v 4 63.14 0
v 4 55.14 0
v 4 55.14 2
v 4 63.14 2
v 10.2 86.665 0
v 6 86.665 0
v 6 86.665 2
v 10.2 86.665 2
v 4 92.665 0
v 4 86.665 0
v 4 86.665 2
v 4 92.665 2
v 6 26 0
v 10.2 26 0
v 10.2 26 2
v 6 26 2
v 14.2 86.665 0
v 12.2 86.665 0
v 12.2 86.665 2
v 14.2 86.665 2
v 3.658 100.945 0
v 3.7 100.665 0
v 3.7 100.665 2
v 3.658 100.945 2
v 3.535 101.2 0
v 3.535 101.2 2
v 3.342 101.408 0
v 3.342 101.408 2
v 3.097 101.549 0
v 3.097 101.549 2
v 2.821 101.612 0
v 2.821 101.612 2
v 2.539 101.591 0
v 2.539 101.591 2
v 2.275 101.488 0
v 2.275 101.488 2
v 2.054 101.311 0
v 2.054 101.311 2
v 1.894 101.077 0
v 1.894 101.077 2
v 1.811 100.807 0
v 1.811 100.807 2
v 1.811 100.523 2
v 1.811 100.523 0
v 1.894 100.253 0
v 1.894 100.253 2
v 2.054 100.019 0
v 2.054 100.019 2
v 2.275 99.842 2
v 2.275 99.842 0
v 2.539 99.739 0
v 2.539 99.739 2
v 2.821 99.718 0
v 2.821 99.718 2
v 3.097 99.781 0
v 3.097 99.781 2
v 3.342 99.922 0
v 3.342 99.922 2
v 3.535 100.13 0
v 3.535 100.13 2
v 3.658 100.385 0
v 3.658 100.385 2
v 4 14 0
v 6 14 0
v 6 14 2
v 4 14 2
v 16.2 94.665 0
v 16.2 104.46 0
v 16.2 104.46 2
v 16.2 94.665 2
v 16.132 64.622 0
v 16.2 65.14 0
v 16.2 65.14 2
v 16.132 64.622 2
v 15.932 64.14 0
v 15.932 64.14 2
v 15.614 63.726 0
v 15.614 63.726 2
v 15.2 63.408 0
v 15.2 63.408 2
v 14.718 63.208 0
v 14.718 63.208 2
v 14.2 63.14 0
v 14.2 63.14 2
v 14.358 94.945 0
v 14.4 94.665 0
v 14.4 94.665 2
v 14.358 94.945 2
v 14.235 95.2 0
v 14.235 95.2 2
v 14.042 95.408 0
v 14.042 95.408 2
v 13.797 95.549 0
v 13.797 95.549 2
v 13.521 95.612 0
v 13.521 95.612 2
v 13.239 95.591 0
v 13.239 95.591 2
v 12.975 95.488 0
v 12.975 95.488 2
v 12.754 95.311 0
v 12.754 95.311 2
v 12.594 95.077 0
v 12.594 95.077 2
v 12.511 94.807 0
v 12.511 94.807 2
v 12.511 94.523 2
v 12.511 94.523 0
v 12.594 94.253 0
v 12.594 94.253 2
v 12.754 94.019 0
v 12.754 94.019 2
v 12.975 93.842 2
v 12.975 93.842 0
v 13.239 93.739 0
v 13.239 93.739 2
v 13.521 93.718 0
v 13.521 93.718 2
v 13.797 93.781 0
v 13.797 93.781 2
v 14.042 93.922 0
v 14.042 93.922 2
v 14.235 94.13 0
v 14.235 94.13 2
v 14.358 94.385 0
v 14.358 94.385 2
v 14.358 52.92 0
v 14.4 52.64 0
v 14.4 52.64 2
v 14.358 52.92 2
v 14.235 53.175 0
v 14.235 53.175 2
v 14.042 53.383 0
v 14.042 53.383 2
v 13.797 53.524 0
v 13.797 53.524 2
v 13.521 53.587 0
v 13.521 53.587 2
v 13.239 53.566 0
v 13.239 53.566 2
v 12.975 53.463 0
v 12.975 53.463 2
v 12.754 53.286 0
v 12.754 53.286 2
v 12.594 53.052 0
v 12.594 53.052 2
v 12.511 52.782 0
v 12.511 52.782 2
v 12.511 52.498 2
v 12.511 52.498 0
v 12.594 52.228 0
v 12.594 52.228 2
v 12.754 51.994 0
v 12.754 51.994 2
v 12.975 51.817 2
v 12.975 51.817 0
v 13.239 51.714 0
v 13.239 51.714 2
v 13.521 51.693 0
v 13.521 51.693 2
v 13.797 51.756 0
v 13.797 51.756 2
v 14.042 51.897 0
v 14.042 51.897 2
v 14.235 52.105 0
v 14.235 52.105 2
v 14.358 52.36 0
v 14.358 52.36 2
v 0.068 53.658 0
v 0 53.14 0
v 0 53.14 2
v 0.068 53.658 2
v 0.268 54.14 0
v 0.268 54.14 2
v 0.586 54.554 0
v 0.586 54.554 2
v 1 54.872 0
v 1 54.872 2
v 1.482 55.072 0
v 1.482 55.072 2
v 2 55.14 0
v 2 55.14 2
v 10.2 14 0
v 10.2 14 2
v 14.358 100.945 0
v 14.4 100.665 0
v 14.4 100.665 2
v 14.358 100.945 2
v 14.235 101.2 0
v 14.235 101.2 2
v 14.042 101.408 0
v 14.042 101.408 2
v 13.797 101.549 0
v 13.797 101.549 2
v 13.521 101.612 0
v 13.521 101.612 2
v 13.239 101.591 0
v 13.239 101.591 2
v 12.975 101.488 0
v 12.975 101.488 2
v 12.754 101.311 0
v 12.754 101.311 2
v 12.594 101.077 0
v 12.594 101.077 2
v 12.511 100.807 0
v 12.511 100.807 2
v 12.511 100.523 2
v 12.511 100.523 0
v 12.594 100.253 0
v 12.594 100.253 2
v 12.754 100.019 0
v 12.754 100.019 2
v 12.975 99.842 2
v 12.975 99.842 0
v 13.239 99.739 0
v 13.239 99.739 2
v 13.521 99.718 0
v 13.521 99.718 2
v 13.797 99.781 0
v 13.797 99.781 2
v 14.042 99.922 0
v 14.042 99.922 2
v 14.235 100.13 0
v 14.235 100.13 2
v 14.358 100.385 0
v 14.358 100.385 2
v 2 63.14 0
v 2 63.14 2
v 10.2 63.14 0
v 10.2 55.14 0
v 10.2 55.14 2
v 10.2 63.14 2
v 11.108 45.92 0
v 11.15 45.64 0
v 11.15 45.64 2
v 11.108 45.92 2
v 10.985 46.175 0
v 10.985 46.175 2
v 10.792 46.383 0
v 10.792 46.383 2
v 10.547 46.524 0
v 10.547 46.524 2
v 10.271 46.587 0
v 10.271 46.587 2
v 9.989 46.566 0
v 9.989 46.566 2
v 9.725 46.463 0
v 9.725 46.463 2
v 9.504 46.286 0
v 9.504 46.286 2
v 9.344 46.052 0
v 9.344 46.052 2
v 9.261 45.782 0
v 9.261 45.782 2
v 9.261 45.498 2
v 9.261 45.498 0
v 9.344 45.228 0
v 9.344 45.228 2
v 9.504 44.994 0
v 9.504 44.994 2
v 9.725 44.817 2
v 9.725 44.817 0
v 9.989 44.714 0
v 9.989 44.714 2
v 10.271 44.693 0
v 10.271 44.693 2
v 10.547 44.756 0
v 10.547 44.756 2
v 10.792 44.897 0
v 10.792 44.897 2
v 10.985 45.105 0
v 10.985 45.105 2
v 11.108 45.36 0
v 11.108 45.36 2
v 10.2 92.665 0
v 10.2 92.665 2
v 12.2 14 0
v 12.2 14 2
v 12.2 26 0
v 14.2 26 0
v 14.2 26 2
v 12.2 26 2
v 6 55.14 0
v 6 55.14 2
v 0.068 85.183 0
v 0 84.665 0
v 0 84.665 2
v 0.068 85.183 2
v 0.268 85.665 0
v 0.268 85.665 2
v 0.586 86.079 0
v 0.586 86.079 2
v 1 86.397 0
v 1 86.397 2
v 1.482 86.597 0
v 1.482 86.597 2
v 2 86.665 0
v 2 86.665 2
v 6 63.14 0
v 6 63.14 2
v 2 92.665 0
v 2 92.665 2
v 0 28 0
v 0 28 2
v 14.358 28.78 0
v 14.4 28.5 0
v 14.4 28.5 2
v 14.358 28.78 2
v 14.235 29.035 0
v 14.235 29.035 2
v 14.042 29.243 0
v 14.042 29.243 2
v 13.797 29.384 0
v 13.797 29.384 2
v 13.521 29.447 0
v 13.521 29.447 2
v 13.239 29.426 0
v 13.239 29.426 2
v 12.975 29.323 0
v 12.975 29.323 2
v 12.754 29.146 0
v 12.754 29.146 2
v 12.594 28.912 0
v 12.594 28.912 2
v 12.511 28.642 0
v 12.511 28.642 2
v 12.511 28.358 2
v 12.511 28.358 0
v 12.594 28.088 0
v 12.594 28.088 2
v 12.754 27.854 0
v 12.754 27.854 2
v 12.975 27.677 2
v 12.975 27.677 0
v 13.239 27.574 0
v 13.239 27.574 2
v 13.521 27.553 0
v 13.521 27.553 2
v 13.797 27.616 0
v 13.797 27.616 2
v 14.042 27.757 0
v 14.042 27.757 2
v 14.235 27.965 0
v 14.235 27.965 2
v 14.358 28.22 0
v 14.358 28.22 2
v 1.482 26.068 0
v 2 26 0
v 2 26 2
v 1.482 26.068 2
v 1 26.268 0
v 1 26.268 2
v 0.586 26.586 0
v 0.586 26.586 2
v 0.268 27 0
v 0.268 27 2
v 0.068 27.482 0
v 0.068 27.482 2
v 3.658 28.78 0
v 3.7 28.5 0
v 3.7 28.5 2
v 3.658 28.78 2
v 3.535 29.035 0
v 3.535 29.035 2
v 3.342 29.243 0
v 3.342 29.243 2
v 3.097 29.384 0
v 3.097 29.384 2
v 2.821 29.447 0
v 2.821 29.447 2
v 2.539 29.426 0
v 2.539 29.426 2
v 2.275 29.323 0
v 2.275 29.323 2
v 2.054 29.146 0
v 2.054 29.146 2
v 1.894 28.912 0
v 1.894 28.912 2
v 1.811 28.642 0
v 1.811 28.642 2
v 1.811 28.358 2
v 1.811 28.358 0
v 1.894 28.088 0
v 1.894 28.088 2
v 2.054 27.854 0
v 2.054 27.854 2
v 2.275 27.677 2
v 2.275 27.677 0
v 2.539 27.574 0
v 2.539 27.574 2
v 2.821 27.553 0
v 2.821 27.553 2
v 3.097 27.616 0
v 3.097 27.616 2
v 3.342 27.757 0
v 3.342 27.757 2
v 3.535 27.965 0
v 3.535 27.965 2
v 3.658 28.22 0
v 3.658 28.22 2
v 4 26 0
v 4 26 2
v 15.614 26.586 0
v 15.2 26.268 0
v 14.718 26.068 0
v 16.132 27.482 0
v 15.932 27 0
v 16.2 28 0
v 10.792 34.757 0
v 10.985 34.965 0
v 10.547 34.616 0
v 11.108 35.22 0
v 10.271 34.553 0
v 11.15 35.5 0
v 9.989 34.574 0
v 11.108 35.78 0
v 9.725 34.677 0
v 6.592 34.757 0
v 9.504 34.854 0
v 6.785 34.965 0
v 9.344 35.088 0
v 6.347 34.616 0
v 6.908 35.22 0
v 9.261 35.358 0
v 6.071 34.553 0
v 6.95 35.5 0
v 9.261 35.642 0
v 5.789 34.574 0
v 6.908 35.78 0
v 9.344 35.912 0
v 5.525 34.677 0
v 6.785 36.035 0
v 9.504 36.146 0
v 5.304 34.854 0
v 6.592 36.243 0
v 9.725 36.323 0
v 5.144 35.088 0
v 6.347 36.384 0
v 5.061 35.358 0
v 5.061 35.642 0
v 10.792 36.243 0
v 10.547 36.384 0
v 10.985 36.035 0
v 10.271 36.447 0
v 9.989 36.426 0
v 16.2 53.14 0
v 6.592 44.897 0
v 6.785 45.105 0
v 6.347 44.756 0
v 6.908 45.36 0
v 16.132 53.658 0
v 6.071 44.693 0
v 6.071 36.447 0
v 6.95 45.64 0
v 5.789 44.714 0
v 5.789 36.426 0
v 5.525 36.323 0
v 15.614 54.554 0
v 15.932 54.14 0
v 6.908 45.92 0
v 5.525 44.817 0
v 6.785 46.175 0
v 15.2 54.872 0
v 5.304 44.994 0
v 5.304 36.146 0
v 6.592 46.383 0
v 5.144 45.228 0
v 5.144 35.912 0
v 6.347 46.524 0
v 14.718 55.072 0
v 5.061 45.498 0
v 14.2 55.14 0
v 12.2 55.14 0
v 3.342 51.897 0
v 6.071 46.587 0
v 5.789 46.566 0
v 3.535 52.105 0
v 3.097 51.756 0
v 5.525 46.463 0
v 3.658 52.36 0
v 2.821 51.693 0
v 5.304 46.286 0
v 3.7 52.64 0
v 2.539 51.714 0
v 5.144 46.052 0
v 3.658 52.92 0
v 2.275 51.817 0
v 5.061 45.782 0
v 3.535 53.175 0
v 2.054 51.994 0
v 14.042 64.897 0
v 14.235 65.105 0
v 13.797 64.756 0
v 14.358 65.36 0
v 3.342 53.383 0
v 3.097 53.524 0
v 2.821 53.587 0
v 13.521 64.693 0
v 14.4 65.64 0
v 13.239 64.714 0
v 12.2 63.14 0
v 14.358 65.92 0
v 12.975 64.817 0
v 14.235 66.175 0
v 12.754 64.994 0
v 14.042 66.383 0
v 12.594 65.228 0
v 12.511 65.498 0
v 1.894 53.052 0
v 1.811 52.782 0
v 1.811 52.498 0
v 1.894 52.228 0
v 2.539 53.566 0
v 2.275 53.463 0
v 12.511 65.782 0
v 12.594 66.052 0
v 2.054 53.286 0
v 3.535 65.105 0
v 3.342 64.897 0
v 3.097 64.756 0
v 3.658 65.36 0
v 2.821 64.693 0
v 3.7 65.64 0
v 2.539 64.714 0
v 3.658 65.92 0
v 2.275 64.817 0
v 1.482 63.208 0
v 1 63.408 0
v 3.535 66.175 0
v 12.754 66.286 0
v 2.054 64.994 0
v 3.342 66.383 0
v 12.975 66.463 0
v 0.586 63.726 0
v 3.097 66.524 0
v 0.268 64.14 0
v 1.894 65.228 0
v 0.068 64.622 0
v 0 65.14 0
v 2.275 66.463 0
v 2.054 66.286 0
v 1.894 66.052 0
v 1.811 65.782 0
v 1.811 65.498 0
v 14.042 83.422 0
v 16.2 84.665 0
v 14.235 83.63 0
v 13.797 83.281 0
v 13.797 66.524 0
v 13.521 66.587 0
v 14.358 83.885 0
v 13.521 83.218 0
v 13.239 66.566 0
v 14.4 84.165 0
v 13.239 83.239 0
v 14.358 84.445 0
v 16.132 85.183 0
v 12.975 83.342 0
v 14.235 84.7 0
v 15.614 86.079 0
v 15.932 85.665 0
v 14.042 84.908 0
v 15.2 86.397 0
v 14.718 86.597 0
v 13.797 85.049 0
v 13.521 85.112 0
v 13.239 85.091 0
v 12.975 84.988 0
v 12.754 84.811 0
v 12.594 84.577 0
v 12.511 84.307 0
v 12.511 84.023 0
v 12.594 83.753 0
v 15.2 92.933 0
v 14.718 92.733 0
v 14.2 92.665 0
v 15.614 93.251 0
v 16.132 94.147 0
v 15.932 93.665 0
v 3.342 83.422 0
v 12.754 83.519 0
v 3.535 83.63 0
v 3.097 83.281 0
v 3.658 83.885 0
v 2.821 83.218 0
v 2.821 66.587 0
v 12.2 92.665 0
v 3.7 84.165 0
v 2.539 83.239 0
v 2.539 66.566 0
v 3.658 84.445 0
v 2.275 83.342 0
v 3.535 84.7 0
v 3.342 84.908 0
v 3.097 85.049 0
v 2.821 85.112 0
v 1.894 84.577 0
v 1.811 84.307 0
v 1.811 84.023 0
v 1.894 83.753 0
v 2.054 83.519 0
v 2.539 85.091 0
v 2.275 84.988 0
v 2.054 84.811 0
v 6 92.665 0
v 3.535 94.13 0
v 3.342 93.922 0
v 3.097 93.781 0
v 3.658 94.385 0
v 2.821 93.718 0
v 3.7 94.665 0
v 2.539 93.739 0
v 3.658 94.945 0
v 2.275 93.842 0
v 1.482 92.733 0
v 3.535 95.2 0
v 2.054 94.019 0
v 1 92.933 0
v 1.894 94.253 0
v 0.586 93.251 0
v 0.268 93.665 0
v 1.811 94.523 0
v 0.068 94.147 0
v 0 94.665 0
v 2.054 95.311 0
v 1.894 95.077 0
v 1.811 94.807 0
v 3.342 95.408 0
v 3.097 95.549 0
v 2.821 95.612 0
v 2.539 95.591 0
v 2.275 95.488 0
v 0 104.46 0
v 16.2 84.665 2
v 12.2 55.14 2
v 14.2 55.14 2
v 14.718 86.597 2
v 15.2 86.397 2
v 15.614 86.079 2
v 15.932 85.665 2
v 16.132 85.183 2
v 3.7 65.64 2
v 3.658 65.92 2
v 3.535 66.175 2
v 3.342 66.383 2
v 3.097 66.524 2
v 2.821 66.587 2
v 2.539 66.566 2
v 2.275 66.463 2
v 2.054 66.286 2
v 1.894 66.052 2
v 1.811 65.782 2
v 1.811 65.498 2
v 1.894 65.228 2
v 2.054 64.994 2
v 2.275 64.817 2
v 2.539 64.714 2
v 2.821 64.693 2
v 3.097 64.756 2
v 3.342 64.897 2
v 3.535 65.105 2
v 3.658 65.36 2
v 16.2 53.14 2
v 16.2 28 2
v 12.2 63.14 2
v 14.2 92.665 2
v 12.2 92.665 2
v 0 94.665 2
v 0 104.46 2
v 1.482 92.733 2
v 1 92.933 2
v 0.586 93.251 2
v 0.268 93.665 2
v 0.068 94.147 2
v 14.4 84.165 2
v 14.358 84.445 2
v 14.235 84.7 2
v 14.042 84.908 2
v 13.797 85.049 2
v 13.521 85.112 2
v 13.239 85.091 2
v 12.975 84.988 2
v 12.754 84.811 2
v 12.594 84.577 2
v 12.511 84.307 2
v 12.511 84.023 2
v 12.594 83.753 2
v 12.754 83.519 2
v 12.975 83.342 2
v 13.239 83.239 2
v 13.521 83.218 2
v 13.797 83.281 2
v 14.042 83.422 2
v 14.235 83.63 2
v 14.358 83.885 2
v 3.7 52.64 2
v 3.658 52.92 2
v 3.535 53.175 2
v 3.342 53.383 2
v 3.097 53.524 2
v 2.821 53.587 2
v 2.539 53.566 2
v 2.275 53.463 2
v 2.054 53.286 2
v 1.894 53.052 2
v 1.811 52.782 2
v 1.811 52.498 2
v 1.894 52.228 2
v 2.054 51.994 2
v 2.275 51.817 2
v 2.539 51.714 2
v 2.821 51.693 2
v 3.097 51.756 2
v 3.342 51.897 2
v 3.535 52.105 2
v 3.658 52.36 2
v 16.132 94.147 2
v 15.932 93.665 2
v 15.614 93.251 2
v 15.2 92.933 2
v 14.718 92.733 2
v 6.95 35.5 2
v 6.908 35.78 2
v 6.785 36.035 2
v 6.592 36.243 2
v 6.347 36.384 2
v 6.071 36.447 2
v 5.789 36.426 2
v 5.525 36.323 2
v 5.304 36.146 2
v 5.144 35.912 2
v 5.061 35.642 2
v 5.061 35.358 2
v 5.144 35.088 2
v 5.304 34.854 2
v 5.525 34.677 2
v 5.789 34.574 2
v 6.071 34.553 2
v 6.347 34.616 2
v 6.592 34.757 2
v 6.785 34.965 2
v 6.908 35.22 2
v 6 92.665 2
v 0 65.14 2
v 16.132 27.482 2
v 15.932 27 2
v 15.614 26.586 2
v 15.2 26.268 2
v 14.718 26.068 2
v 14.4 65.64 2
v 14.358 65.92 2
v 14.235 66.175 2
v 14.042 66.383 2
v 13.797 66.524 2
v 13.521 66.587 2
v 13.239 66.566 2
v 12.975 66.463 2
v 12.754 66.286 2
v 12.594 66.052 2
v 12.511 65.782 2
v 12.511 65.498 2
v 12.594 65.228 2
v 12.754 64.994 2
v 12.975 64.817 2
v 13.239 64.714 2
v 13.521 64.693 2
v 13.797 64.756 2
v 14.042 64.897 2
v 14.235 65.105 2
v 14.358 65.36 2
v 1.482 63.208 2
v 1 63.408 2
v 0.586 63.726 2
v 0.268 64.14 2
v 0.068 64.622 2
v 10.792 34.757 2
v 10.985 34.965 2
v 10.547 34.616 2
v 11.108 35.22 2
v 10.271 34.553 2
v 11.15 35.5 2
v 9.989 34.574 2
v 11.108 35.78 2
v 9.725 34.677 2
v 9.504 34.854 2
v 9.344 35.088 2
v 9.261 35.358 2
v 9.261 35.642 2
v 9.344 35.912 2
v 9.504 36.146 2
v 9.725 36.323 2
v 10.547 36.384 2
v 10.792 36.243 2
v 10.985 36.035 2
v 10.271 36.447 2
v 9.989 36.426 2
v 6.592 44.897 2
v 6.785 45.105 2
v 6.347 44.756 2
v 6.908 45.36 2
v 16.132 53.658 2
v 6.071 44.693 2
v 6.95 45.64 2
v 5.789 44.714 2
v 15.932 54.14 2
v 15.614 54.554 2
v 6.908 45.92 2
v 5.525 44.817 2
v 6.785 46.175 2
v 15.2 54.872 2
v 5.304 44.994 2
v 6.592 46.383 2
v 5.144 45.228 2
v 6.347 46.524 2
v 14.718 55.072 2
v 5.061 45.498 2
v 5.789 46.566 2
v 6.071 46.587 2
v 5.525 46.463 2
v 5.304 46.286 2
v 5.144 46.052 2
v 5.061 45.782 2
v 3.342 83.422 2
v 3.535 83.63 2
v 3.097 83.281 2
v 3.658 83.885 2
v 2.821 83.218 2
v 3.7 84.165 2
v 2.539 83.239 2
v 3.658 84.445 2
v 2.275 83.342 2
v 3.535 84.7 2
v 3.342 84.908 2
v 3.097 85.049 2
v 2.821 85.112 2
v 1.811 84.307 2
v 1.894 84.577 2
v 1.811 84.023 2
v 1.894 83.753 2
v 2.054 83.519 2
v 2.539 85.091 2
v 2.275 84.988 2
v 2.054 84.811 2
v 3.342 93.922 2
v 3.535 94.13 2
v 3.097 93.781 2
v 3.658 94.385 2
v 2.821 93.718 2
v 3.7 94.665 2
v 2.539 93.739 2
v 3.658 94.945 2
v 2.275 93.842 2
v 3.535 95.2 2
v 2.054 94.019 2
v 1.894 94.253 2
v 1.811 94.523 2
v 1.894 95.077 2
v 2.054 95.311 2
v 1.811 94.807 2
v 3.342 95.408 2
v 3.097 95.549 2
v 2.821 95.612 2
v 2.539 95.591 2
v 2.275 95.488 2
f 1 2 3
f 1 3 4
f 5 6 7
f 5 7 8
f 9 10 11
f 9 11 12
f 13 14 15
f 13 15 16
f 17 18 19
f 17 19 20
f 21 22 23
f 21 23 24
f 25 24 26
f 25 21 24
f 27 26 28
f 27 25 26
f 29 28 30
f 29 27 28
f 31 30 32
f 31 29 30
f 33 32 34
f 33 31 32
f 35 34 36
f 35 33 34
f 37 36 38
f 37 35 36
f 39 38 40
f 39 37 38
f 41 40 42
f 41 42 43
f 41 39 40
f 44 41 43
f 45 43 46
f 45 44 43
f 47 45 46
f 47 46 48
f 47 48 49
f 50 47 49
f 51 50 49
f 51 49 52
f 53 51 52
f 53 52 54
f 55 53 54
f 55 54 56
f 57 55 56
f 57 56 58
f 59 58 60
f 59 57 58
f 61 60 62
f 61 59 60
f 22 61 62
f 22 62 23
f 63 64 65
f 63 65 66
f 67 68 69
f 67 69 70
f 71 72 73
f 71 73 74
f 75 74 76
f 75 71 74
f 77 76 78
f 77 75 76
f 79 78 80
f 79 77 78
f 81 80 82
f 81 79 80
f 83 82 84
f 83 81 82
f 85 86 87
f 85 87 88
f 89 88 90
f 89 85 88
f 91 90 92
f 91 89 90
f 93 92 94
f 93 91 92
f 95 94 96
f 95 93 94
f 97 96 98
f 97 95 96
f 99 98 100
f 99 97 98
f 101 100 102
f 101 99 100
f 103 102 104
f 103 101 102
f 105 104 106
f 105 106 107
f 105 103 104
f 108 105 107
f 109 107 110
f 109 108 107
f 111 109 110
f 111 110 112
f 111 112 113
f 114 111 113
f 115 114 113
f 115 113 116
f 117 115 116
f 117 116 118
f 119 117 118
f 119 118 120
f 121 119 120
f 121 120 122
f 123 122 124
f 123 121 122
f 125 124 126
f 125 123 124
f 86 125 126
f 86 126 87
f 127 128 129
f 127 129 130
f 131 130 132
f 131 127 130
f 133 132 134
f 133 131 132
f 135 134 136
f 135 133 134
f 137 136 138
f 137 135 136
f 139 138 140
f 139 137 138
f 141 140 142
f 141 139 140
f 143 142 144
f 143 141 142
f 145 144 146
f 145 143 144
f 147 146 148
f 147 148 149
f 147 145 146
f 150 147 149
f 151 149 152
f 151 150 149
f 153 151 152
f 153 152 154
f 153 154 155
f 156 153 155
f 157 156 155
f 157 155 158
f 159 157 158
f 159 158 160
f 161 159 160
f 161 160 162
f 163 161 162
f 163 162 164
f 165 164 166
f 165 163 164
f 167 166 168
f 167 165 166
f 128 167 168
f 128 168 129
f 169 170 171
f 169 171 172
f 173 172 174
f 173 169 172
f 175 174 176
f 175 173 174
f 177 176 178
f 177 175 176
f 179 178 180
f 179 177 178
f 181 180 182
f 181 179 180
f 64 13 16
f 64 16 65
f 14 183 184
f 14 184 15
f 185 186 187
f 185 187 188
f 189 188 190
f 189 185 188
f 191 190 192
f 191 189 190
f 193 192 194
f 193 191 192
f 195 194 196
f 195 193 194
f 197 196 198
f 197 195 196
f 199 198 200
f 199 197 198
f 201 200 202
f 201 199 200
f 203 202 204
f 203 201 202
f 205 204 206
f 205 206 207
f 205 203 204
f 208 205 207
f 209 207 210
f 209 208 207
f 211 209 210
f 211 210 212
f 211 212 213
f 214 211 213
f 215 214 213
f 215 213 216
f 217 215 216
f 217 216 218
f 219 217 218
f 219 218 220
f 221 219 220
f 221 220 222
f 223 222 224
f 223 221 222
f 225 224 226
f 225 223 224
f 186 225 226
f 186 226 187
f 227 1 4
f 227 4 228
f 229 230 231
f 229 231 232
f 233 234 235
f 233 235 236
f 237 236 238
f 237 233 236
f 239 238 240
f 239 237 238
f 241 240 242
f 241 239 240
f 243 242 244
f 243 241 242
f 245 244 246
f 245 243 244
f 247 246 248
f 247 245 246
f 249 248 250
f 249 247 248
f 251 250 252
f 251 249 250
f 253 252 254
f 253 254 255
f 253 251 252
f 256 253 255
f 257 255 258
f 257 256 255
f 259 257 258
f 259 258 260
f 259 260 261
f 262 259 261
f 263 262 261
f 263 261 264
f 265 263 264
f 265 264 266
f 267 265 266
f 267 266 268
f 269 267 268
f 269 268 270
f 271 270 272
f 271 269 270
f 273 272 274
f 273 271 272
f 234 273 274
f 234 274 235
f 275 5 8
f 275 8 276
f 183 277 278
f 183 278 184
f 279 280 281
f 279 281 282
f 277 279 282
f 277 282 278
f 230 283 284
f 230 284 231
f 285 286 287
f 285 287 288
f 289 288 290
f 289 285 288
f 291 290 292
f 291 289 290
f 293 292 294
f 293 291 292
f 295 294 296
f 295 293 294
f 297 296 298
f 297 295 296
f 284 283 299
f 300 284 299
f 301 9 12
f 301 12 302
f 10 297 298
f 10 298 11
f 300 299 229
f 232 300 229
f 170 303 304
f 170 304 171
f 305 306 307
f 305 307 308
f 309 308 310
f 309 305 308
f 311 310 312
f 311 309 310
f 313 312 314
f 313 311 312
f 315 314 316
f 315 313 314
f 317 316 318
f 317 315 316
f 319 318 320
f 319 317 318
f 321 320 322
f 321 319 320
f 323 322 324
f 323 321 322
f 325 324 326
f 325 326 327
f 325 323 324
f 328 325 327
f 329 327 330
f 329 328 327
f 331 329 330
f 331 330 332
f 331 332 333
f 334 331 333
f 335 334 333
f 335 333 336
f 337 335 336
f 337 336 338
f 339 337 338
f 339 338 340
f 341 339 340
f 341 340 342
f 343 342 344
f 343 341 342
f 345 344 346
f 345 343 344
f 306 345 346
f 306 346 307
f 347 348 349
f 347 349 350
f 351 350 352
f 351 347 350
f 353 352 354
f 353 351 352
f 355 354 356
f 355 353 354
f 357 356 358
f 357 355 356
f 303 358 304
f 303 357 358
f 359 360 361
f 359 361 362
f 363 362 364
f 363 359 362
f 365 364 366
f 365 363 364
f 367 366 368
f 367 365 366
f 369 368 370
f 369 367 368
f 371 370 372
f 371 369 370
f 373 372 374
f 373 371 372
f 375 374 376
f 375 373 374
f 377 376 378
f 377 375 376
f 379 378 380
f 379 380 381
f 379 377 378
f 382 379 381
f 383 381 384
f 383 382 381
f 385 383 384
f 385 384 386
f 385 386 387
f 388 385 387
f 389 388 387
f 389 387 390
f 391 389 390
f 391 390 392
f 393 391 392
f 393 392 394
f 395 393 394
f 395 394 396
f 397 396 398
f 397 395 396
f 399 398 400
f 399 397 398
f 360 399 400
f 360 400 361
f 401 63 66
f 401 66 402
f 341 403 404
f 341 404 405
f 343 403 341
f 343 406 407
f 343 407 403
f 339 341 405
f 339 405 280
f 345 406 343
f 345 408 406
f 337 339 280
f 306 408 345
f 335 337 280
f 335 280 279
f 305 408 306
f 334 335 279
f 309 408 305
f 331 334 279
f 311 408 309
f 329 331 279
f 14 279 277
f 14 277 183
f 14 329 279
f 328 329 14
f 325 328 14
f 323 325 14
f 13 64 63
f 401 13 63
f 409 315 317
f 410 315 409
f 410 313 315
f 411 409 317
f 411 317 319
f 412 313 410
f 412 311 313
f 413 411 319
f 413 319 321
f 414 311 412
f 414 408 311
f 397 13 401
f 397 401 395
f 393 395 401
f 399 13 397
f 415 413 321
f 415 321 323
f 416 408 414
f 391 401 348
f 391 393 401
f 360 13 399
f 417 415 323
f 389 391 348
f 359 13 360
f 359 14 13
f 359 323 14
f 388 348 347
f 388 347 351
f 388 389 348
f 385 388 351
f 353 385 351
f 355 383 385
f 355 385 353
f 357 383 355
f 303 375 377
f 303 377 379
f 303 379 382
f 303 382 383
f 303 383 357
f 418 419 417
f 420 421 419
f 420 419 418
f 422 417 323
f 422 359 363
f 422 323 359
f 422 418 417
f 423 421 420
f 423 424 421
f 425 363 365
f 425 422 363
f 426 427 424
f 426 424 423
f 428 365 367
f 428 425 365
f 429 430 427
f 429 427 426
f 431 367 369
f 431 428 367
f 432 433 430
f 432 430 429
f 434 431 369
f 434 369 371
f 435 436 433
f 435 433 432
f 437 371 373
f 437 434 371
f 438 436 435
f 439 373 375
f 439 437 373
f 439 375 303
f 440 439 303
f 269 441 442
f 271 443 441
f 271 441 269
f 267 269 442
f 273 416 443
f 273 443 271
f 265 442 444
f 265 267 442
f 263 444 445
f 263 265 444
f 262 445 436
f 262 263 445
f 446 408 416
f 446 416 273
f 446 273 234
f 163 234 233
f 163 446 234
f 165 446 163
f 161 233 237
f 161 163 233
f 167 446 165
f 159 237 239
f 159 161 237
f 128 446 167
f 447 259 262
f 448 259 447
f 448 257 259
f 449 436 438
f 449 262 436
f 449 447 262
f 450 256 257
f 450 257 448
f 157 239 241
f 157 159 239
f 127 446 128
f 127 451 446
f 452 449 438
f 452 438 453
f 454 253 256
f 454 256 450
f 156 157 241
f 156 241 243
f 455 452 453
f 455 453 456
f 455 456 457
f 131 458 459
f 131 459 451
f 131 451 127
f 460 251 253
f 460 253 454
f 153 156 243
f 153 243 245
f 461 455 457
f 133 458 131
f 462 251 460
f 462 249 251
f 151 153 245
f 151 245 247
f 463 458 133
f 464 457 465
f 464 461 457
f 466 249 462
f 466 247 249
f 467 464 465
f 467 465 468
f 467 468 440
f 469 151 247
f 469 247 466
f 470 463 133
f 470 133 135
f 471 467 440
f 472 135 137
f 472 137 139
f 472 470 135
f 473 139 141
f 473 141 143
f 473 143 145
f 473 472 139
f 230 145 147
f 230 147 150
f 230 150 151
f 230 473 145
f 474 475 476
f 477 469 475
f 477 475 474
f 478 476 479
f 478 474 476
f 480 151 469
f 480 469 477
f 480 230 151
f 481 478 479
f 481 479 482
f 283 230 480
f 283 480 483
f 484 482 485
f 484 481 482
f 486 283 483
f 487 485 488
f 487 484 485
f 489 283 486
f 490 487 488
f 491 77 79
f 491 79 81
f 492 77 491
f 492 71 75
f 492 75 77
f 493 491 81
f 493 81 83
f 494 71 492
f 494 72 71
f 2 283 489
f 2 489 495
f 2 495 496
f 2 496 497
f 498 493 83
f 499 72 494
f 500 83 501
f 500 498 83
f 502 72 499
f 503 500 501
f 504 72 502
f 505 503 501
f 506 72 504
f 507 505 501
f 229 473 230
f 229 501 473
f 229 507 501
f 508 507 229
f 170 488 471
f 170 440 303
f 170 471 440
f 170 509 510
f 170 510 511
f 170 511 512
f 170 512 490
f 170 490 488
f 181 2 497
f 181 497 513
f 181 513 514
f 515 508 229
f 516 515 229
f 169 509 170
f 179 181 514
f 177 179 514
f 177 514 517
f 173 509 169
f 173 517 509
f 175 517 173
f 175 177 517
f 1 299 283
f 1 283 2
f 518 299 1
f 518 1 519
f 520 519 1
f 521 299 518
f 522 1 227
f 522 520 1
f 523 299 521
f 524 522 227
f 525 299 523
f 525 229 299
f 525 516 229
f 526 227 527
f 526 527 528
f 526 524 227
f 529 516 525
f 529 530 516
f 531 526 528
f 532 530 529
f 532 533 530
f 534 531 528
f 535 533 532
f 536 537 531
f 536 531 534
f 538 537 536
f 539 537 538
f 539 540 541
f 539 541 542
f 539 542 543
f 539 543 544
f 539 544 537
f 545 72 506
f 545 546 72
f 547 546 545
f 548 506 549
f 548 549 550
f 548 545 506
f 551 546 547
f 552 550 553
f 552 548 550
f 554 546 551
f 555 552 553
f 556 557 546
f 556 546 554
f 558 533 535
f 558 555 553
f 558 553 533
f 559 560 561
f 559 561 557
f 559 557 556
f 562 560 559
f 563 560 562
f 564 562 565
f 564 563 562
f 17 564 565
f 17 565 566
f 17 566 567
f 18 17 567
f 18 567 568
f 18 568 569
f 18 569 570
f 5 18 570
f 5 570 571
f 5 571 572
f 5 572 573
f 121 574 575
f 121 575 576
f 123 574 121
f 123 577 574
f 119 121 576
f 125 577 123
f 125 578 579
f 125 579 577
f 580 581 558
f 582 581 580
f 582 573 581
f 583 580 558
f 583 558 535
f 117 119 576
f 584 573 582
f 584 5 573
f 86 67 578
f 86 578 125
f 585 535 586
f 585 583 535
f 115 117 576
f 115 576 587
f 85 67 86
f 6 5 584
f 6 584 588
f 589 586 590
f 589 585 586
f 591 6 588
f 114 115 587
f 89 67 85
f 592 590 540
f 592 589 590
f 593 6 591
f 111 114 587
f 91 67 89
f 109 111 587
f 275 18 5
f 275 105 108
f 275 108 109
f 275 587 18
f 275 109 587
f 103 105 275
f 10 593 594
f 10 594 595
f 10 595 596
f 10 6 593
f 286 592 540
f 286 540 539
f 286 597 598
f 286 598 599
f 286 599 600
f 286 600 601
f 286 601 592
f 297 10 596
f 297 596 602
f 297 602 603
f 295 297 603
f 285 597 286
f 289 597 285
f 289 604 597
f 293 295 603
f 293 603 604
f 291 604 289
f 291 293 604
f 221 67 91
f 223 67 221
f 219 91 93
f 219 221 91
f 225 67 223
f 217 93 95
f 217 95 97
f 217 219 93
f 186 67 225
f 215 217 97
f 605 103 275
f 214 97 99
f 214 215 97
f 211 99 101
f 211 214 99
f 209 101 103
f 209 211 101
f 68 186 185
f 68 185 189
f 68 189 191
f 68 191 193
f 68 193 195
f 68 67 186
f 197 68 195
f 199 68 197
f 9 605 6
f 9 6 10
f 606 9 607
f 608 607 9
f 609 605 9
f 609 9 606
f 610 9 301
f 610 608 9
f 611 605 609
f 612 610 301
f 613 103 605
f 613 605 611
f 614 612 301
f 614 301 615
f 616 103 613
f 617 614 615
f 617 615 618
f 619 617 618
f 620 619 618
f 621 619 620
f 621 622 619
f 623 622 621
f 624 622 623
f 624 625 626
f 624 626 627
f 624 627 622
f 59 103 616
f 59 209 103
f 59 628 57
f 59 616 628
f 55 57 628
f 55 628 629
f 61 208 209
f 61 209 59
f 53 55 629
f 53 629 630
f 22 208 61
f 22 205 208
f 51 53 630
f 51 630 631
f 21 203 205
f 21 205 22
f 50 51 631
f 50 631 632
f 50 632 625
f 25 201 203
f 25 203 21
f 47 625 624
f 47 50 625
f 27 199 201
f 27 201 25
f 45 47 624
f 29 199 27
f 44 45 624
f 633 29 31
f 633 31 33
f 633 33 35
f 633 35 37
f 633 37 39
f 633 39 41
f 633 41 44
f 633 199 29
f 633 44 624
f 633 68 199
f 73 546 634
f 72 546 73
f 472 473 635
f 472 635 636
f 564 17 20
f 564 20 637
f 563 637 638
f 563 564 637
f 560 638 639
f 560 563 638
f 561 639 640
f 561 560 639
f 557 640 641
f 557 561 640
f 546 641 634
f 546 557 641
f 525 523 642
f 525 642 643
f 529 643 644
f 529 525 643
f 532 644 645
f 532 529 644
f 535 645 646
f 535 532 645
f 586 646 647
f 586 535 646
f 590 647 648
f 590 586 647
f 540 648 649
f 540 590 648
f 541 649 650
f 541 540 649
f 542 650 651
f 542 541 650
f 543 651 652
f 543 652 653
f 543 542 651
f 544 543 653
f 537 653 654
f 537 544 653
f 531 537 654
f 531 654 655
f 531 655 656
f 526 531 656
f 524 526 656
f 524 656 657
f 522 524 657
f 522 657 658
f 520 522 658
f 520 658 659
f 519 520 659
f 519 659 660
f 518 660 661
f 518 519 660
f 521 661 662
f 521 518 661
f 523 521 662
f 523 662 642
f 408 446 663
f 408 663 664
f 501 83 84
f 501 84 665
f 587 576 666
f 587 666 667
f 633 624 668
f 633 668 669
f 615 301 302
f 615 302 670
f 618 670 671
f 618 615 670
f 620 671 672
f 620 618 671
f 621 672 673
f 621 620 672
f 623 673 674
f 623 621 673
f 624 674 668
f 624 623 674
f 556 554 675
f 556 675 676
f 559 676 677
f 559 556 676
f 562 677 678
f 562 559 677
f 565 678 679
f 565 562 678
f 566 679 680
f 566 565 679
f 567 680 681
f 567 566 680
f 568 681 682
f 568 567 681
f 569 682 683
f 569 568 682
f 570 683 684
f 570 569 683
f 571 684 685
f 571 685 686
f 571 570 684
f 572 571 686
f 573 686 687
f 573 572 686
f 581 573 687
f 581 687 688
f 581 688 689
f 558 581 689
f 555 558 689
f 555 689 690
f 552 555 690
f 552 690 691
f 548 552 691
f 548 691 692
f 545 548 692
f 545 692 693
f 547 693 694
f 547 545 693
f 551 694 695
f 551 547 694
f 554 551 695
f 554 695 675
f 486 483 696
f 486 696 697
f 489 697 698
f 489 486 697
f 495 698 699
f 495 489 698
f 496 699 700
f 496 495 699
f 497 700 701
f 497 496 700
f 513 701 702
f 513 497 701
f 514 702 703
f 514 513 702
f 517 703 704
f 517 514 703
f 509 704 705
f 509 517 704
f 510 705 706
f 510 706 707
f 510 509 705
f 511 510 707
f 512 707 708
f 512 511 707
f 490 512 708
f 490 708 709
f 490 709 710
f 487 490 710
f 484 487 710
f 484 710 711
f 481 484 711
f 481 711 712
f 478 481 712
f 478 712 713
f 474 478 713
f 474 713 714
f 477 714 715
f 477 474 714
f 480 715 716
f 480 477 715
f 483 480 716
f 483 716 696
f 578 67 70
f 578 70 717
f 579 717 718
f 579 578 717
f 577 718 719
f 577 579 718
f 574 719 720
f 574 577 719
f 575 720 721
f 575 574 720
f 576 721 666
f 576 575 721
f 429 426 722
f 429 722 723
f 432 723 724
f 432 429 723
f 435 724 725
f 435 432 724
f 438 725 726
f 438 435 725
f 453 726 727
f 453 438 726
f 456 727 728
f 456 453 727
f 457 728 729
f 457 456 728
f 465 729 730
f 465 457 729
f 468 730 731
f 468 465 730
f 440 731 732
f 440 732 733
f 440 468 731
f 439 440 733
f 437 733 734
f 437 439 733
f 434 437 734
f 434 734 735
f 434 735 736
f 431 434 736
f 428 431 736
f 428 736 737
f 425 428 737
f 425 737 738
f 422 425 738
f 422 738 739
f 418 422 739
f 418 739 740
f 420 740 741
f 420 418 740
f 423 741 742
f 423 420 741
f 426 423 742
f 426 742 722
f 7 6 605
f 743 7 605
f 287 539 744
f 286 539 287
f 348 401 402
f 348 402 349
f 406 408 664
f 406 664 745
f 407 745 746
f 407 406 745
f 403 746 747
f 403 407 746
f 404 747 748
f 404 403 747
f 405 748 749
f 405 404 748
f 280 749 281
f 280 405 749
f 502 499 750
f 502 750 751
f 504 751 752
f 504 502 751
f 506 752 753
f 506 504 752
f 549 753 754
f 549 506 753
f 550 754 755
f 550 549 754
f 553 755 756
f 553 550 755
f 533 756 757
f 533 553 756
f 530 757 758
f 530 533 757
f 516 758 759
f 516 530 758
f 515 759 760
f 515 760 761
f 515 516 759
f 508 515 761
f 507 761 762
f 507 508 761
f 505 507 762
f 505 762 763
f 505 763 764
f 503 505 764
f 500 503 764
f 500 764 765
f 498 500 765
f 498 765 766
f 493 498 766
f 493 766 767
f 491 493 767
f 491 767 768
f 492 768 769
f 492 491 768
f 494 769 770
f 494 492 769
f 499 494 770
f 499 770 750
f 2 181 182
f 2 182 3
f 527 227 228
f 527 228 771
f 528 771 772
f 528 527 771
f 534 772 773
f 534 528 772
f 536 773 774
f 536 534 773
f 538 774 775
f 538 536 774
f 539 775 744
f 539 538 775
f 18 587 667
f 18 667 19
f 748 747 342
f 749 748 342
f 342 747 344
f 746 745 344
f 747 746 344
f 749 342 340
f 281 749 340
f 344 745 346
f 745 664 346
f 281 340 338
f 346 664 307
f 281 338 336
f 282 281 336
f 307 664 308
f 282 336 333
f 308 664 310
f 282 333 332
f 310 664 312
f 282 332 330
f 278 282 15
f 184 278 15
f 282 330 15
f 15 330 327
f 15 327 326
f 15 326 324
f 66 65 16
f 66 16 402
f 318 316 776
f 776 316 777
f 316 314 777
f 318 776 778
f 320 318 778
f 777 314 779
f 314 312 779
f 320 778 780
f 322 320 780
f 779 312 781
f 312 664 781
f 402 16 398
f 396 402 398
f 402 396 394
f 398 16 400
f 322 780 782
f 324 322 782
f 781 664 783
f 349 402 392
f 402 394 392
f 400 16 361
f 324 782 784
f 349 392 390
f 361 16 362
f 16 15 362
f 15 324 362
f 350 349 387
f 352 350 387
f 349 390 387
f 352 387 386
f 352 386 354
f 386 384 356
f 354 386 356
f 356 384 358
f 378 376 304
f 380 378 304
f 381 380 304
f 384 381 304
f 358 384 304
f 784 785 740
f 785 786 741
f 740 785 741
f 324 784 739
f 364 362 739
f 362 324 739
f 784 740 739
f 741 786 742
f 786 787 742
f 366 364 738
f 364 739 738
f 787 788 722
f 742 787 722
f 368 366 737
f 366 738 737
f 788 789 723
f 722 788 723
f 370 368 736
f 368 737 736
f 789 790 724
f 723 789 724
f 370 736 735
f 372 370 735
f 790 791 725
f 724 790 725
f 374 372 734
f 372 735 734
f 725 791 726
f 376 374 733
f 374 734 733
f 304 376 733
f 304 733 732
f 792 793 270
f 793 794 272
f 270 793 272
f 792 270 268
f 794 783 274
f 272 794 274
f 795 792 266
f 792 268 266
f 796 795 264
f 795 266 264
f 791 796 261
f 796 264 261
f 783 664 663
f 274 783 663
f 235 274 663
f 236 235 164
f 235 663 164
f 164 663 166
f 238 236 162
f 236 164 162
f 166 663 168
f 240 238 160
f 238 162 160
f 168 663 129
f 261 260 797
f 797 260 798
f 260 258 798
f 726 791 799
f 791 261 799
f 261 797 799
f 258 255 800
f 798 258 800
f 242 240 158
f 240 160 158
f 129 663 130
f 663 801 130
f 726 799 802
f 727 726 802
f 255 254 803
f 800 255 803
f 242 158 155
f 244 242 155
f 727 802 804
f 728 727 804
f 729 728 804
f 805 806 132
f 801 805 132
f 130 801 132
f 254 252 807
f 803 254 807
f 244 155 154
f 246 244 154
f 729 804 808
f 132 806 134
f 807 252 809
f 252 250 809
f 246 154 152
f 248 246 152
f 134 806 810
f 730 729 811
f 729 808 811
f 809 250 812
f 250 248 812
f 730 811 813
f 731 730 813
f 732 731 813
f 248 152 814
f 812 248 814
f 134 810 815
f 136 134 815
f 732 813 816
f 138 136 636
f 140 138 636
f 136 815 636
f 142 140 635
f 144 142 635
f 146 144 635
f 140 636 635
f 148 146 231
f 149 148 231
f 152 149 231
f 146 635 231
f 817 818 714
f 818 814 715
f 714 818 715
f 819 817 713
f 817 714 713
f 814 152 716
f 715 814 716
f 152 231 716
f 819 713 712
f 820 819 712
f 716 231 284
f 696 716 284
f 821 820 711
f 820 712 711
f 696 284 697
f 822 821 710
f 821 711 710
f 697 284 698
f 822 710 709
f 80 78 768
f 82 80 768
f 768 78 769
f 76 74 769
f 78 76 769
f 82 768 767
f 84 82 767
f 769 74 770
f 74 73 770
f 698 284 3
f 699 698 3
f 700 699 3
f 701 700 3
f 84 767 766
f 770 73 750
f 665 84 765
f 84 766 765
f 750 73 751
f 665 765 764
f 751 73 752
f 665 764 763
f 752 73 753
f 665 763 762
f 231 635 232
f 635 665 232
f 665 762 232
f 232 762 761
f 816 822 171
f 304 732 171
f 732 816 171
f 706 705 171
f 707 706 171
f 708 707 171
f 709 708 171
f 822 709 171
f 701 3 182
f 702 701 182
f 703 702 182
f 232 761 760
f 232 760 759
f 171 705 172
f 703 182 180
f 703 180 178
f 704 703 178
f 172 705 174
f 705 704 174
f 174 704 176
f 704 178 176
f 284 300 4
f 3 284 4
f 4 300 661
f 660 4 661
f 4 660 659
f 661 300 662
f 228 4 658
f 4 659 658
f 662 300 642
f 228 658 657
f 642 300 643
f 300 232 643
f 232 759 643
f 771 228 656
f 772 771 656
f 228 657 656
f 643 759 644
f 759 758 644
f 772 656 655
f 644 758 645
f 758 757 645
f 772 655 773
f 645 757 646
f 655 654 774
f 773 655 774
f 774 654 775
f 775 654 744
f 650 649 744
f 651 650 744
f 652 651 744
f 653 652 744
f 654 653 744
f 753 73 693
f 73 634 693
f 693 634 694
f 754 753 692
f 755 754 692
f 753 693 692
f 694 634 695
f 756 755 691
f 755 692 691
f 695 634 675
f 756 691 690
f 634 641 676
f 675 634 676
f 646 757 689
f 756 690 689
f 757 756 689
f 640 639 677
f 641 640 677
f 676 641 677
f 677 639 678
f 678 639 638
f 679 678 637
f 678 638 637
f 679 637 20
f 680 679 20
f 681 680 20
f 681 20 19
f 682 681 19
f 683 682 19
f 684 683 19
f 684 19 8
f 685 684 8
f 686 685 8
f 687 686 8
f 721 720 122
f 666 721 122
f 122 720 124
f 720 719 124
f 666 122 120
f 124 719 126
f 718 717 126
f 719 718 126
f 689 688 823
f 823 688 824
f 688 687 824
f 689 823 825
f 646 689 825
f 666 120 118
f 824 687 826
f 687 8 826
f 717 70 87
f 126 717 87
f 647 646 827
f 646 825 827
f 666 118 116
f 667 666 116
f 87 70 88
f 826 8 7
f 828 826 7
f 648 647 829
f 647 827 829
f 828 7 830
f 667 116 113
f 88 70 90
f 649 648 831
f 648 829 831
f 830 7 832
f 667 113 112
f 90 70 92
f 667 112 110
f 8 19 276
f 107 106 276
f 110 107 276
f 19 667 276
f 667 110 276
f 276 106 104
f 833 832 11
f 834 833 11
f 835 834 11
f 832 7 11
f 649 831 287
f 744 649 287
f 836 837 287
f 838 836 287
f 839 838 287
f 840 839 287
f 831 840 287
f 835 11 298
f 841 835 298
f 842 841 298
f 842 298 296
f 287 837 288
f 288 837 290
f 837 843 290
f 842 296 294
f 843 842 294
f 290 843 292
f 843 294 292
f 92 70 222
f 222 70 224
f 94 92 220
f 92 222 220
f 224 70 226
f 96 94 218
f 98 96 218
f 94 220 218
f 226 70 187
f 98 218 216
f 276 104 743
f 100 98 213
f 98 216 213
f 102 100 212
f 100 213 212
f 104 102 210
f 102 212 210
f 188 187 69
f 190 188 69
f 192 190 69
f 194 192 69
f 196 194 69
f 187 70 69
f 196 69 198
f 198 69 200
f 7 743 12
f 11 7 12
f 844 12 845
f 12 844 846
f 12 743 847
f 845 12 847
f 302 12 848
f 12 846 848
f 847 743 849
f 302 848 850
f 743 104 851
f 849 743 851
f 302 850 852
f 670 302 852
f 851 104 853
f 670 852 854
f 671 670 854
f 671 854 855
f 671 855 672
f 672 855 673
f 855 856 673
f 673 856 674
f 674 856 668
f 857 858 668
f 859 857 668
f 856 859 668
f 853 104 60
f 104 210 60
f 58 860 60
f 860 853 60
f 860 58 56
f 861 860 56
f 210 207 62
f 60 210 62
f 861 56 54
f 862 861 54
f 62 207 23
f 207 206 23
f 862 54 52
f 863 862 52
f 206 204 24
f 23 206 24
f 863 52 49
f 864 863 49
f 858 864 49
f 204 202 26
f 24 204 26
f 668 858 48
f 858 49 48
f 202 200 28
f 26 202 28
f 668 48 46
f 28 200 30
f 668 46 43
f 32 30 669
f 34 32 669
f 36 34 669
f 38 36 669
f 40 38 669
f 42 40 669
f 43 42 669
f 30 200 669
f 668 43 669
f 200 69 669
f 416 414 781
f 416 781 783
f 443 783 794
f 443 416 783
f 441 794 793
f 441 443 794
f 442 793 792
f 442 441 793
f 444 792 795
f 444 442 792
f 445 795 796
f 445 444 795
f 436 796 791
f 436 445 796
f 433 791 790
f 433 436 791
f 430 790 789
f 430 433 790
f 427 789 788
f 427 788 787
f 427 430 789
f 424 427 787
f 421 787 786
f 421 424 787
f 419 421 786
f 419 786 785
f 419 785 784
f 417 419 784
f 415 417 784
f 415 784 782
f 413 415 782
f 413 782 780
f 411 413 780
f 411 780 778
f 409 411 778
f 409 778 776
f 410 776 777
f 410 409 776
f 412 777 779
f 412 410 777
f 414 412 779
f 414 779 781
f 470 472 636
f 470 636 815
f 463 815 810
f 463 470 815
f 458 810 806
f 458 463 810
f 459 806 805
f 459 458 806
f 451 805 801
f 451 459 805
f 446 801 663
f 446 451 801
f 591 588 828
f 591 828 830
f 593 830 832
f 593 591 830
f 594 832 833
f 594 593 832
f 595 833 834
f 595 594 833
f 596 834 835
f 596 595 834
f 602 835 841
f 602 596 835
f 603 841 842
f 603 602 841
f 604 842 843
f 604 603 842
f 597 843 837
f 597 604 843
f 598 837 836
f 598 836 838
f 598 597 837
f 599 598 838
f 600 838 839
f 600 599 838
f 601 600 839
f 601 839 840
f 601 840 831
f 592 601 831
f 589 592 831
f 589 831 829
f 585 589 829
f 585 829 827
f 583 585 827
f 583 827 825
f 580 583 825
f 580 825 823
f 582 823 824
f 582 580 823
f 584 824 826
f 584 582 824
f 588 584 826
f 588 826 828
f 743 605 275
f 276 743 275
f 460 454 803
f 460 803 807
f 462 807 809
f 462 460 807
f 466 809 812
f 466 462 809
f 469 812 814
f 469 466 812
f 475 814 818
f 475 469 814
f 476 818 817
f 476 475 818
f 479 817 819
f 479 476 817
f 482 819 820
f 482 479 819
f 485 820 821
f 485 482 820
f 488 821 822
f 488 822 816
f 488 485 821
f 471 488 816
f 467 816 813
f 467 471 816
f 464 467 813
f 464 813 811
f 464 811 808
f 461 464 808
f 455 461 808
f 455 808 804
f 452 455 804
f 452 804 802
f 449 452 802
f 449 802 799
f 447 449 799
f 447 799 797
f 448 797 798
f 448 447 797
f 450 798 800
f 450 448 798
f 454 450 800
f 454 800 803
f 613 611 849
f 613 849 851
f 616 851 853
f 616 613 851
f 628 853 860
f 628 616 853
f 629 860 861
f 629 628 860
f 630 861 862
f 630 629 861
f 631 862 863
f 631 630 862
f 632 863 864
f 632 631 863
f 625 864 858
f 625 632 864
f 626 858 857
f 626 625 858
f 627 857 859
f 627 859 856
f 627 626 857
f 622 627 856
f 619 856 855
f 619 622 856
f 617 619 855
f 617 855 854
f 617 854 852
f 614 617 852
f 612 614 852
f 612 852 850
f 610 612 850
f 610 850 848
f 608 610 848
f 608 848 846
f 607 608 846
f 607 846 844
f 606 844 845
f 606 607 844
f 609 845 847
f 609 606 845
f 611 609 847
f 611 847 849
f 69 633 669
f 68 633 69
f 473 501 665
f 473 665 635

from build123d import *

# Parameters (mm, degrees)
SKETCH1_R           = 0.95
SKETCH1_W           = 4.2
SKETCH1_H           = 8
SKETCH1_H_2         = 6
BOSS_EXTRUDE1_DEPTH = 2


with BuildPart() as part:
    # Sketch1 → Boss-Extrude1 (new body)
    with BuildSketch(Plane.XY):
        with BuildLine():
            Line((4, 26), (2, 26))
            ThreePointArc((2, 26), (0.585786438, 26.585786438), (0, 28))
            Line((0, 28), (0, 53.14))
            ThreePointArc((0, 53.14), (0.585786438, 54.554213562), (2, 55.14))
            Line((2, 55.14), (4, 55.14))
            Line((4, 55.14), (4, 63.14))
            Line((4, 63.14), (2, 63.14))
            ThreePointArc((2, 63.14), (0.585786438, 63.725786438), (0, 65.14))
            Line((0, 65.14), (0, 84.665))
            ThreePointArc((0, 84.665), (0.585786438, 86.079213562), (2, 86.665))
            Line((2, 86.665), (4, 86.665))
            Line((4, 86.665), (4, 92.665))
            Line((4, 92.665), (2, 92.665))
            ThreePointArc((2, 92.665), (0.585786438, 93.250786438), (0, 94.665))
            Line((0, 94.665), (0, 104.46))
            Line((0, 104.46), (16.2, 104.46))
            Line((16.2, 104.46), (16.2, 94.665))
            ThreePointArc((16.2, 94.665), (15.614213562, 93.250786438), (14.2, 92.665))
            Line((14.2, 92.665), (12.2, 92.665))
            Line((12.2, 92.665), (12.2, 86.665))
            Line((12.2, 86.665), (14.2, 86.665))
            ThreePointArc((14.2, 86.665), (15.614213562, 86.079213562), (16.2, 84.665))
            Line((16.2, 84.665), (16.2, 65.14))
            ThreePointArc((16.2, 65.14), (15.614213562, 63.725786438), (14.2, 63.14))
            Line((14.2, 63.14), (12.2, 63.14))
            Line((12.2, 63.14), (12.2, 55.14))
            Line((12.2, 55.14), (14.2, 55.14))
            ThreePointArc((14.2, 55.14), (15.614213562, 54.554213562), (16.2, 53.14))
            Line((16.2, 53.14), (16.2, 28))
            ThreePointArc((16.2, 28), (15.614213562, 26.585786438), (14.2, 26))
            Line((14.2, 26), (12.2, 26))
            Line((12.2, 26), (12.2, 14))
            Line((12.2, 14), (10.2, 14))
            Line((10.2, 14), (10.2, 26))
            Line((10.2, 26), (6, 26))
            Line((6, 26), (6, 14))
            Line((6, 14), (4, 14))
            Line((4, 14), (4, 26))
        make_face()
        with Locations((13.45, 94.665)):
            Circle(SKETCH1_R, mode=Mode.SUBTRACT)
        with Locations((13.45, 84.165)):
            Circle(SKETCH1_R, mode=Mode.SUBTRACT)
        with Locations((13.45, 65.64)):
            Circle(SKETCH1_R, mode=Mode.SUBTRACT)
        with Locations((13.45, 52.64)):
            Circle(SKETCH1_R, mode=Mode.SUBTRACT)
        with Locations((13.45, 28.5)):
            Circle(SKETCH1_R, mode=Mode.SUBTRACT)
        with Locations((10.2, 35.5)):
            Circle(SKETCH1_R, mode=Mode.SUBTRACT)
        with Locations((10.2, 45.64)):
            Circle(SKETCH1_R, mode=Mode.SUBTRACT)
        with Locations((13.45, 100.665)):
            Circle(SKETCH1_R, mode=Mode.SUBTRACT)
        with Locations((2.75, 100.665)):
            Circle(SKETCH1_R, mode=Mode.SUBTRACT)
        with Locations((6, 45.64)):
            Circle(SKETCH1_R, mode=Mode.SUBTRACT)
        with Locations((6, 35.5)):
            Circle(SKETCH1_R, mode=Mode.SUBTRACT)
        with Locations((2.75, 28.5)):
            Circle(SKETCH1_R, mode=Mode.SUBTRACT)
        with Locations((2.75, 52.64)):
            Circle(SKETCH1_R, mode=Mode.SUBTRACT)
        with Locations((2.75, 65.64)):
            Circle(SKETCH1_R, mode=Mode.SUBTRACT)
        with Locations((2.75, 84.165)):
            Circle(SKETCH1_R, mode=Mode.SUBTRACT)
        with Locations((2.75, 94.665)):
            Circle(SKETCH1_R, mode=Mode.SUBTRACT)
        with Locations((8.1, 59.14)):
            Rectangle(SKETCH1_W, SKETCH1_H, mode=Mode.SUBTRACT)
        with Locations((8.1, 89.665)):
            Rectangle(SKETCH1_W, SKETCH1_H_2, mode=Mode.SUBTRACT)
    extrude(amount=BOSS_EXTRUDE1_DEPTH)


solid = part.part
